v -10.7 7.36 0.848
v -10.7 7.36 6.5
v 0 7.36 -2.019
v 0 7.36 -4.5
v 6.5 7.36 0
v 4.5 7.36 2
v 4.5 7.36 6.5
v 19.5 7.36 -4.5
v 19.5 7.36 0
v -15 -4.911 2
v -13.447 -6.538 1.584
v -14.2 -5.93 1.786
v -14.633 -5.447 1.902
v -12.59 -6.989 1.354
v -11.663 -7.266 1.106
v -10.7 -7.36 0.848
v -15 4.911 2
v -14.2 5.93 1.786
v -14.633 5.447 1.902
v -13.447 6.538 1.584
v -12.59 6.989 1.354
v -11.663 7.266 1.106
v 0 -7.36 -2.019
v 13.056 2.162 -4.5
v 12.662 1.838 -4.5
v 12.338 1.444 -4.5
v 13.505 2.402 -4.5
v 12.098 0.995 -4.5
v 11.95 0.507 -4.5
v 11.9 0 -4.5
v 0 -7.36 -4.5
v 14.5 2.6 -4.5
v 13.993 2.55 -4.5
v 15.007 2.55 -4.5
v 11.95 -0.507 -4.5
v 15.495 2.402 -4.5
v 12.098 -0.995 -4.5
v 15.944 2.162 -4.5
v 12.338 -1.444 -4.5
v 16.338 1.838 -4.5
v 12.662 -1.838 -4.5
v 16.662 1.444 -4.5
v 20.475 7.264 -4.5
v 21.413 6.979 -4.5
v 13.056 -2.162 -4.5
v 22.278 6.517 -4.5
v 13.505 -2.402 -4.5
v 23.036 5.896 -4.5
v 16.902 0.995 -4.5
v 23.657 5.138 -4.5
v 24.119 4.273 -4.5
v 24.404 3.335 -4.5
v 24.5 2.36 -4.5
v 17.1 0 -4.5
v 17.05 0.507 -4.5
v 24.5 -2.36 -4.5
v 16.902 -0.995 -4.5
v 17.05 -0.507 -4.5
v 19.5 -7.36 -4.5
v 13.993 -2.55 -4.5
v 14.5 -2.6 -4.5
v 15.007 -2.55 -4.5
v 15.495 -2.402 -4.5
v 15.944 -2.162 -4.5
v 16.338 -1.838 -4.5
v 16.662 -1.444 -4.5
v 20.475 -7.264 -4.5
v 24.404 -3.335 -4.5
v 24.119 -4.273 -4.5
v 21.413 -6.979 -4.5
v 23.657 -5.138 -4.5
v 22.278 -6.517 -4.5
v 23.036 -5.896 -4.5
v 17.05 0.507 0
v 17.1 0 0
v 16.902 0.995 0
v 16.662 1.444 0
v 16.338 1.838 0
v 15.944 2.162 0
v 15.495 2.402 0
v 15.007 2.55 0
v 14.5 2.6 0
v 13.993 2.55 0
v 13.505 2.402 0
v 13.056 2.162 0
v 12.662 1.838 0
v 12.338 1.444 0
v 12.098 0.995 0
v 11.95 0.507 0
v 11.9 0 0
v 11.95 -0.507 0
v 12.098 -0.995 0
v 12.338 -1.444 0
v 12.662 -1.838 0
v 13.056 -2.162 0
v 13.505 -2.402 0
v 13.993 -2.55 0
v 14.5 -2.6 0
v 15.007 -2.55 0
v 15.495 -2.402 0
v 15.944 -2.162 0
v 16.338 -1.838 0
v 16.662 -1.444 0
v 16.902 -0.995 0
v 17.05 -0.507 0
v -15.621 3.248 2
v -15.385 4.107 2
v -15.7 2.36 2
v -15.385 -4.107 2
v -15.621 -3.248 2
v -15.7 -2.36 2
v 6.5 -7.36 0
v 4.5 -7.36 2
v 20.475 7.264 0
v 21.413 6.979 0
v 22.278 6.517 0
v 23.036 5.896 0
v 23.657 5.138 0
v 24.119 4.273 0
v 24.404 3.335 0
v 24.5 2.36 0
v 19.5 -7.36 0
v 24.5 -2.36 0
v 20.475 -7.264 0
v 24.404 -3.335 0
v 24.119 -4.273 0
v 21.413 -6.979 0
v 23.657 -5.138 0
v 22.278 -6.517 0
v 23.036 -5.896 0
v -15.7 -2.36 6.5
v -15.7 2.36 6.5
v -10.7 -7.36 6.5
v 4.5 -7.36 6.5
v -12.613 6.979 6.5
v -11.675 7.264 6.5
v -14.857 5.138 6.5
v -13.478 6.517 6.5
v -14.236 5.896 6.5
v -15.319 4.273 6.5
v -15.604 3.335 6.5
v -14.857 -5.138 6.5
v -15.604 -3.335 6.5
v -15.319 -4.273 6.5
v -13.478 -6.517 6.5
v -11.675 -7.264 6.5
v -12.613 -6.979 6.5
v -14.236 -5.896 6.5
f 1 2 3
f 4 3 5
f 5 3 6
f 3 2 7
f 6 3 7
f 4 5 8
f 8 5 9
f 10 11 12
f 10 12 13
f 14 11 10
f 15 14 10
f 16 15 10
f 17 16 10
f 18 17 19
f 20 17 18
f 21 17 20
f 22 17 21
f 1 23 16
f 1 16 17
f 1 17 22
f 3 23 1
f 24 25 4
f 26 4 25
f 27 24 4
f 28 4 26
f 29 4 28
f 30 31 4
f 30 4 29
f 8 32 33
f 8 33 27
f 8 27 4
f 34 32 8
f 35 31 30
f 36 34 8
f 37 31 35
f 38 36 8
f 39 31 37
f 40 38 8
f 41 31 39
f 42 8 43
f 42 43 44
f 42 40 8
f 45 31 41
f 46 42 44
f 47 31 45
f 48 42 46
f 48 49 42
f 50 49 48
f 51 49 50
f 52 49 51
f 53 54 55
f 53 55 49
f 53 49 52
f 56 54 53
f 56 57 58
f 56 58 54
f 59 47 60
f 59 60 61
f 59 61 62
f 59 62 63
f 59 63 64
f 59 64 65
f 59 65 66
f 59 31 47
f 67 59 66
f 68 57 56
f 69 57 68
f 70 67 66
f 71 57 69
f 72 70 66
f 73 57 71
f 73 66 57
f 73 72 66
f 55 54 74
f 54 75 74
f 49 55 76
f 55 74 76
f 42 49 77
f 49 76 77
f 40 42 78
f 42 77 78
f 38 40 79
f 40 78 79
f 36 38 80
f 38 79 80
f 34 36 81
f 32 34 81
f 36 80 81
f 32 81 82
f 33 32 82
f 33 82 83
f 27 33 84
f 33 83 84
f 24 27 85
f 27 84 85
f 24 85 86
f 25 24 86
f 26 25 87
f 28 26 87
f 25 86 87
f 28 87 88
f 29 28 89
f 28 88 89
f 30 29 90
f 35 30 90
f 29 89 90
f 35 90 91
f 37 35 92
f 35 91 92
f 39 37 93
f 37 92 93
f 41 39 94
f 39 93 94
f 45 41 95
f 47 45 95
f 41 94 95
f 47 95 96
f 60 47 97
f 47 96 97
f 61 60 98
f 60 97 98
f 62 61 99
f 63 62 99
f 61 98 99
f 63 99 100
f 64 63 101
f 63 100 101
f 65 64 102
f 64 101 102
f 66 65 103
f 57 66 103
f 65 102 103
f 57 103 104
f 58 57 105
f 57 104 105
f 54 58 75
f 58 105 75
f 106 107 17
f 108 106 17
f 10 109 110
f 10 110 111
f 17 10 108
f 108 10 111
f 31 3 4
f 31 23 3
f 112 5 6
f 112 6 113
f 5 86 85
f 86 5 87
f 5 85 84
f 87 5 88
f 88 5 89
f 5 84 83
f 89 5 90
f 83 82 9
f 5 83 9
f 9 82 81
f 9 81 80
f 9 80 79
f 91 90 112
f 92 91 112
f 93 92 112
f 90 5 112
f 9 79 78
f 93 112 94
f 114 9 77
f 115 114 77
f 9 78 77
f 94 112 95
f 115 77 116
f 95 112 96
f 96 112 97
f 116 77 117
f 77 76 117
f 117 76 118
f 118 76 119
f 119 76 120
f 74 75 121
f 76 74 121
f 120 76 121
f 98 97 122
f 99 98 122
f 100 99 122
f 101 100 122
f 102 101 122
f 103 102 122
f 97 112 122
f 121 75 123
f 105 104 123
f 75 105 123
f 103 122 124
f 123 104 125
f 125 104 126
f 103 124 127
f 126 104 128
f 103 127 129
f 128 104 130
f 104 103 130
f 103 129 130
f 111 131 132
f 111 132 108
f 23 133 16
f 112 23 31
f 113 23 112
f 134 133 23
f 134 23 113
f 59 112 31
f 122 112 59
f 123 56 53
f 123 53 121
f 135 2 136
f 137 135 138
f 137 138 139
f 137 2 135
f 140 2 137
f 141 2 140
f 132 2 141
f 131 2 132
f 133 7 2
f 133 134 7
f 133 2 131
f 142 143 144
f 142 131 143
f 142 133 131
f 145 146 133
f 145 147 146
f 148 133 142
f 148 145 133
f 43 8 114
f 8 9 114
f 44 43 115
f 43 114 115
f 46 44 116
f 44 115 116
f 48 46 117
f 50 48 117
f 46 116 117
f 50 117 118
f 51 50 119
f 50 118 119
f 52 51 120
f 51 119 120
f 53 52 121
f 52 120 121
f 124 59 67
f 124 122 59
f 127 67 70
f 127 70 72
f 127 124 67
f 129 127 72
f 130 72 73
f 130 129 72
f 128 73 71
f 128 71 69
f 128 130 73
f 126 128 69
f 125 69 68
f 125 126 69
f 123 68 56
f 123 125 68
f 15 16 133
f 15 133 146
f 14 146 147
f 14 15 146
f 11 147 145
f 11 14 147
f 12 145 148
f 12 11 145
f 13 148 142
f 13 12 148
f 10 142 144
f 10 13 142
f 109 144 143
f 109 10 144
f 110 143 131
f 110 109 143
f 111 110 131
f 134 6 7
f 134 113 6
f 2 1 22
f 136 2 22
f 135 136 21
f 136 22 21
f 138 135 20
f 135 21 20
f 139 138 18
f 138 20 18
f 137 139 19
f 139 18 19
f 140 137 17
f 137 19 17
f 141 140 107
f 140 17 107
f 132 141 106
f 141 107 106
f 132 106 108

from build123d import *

# Parameters (mm, degrees)
F0_W     = 4.5
F0_H     = 2
F0_H_2   = 4.5
F0_W_2   = 20
F1_DEPTH = 7.36
F2_R     = 2.6
F3_DEPTH = 50
F4_SIZE2 = 4.0192378865
F4_SIZE  = 15
F5_R     = 5
F6_SIZE  = 2


with BuildPart() as f1:
    # F0 (on Front) → F1 (new body, symmetric)
    with BuildSketch(Plane.XZ):
        with Locations((2.25, 1)):
            Rectangle(F0_W, F0_H)
        with Locations((2.25, -2.25)):
            Rectangle(F0_W, F0_H_2)
        with Locations((14.5, -2.25)):
            Rectangle(F0_W_2, F0_H_2)
        Polygon((-15.7, 2), (0, 2), (4.5, 2), (4.5, 6.5), (-15.7, 6.5), align=None)
    extrude(amount=F1_DEPTH, both=True)

    # F2 (on face) → F3 (cut, symmetric)
    with BuildSketch(Plane.XY):
        with Locations((14.5, 0)):
            Circle(F2_R)
    extrude(amount=F3_DEPTH, both=True, mode=Mode.SUBTRACT)

    # F4
    f4_edges = [f1.edges().sort_by_distance(p)[0] for p in [
        (0, 0, 2),
    ]]
    f4_side = f1.faces().sort_by_distance((-7.85, 0, 2))[0]
    chamfer(f4_edges, length=F4_SIZE, length2=F4_SIZE2, reference=f4_side)

    # F5
    f5_edges = [f1.edges().sort_by_distance(p)[0] for p in [
        (-15.7, 7.36, 4.25),
        (-15.7, -7.36, 4.25),
        (24.5, 7.36, -2.25),
        (24.5, -7.36, -2.25),
    ]]
    fillet(f5_edges, radius=F5_R)

    # F6
    f6_edges = [f1.edges().sort_by_distance(p)[0] for p in [
        (4.5, 0, 0),
    ]]
    chamfer(f6_edges, length=F6_SIZE)


solid = f1.part
